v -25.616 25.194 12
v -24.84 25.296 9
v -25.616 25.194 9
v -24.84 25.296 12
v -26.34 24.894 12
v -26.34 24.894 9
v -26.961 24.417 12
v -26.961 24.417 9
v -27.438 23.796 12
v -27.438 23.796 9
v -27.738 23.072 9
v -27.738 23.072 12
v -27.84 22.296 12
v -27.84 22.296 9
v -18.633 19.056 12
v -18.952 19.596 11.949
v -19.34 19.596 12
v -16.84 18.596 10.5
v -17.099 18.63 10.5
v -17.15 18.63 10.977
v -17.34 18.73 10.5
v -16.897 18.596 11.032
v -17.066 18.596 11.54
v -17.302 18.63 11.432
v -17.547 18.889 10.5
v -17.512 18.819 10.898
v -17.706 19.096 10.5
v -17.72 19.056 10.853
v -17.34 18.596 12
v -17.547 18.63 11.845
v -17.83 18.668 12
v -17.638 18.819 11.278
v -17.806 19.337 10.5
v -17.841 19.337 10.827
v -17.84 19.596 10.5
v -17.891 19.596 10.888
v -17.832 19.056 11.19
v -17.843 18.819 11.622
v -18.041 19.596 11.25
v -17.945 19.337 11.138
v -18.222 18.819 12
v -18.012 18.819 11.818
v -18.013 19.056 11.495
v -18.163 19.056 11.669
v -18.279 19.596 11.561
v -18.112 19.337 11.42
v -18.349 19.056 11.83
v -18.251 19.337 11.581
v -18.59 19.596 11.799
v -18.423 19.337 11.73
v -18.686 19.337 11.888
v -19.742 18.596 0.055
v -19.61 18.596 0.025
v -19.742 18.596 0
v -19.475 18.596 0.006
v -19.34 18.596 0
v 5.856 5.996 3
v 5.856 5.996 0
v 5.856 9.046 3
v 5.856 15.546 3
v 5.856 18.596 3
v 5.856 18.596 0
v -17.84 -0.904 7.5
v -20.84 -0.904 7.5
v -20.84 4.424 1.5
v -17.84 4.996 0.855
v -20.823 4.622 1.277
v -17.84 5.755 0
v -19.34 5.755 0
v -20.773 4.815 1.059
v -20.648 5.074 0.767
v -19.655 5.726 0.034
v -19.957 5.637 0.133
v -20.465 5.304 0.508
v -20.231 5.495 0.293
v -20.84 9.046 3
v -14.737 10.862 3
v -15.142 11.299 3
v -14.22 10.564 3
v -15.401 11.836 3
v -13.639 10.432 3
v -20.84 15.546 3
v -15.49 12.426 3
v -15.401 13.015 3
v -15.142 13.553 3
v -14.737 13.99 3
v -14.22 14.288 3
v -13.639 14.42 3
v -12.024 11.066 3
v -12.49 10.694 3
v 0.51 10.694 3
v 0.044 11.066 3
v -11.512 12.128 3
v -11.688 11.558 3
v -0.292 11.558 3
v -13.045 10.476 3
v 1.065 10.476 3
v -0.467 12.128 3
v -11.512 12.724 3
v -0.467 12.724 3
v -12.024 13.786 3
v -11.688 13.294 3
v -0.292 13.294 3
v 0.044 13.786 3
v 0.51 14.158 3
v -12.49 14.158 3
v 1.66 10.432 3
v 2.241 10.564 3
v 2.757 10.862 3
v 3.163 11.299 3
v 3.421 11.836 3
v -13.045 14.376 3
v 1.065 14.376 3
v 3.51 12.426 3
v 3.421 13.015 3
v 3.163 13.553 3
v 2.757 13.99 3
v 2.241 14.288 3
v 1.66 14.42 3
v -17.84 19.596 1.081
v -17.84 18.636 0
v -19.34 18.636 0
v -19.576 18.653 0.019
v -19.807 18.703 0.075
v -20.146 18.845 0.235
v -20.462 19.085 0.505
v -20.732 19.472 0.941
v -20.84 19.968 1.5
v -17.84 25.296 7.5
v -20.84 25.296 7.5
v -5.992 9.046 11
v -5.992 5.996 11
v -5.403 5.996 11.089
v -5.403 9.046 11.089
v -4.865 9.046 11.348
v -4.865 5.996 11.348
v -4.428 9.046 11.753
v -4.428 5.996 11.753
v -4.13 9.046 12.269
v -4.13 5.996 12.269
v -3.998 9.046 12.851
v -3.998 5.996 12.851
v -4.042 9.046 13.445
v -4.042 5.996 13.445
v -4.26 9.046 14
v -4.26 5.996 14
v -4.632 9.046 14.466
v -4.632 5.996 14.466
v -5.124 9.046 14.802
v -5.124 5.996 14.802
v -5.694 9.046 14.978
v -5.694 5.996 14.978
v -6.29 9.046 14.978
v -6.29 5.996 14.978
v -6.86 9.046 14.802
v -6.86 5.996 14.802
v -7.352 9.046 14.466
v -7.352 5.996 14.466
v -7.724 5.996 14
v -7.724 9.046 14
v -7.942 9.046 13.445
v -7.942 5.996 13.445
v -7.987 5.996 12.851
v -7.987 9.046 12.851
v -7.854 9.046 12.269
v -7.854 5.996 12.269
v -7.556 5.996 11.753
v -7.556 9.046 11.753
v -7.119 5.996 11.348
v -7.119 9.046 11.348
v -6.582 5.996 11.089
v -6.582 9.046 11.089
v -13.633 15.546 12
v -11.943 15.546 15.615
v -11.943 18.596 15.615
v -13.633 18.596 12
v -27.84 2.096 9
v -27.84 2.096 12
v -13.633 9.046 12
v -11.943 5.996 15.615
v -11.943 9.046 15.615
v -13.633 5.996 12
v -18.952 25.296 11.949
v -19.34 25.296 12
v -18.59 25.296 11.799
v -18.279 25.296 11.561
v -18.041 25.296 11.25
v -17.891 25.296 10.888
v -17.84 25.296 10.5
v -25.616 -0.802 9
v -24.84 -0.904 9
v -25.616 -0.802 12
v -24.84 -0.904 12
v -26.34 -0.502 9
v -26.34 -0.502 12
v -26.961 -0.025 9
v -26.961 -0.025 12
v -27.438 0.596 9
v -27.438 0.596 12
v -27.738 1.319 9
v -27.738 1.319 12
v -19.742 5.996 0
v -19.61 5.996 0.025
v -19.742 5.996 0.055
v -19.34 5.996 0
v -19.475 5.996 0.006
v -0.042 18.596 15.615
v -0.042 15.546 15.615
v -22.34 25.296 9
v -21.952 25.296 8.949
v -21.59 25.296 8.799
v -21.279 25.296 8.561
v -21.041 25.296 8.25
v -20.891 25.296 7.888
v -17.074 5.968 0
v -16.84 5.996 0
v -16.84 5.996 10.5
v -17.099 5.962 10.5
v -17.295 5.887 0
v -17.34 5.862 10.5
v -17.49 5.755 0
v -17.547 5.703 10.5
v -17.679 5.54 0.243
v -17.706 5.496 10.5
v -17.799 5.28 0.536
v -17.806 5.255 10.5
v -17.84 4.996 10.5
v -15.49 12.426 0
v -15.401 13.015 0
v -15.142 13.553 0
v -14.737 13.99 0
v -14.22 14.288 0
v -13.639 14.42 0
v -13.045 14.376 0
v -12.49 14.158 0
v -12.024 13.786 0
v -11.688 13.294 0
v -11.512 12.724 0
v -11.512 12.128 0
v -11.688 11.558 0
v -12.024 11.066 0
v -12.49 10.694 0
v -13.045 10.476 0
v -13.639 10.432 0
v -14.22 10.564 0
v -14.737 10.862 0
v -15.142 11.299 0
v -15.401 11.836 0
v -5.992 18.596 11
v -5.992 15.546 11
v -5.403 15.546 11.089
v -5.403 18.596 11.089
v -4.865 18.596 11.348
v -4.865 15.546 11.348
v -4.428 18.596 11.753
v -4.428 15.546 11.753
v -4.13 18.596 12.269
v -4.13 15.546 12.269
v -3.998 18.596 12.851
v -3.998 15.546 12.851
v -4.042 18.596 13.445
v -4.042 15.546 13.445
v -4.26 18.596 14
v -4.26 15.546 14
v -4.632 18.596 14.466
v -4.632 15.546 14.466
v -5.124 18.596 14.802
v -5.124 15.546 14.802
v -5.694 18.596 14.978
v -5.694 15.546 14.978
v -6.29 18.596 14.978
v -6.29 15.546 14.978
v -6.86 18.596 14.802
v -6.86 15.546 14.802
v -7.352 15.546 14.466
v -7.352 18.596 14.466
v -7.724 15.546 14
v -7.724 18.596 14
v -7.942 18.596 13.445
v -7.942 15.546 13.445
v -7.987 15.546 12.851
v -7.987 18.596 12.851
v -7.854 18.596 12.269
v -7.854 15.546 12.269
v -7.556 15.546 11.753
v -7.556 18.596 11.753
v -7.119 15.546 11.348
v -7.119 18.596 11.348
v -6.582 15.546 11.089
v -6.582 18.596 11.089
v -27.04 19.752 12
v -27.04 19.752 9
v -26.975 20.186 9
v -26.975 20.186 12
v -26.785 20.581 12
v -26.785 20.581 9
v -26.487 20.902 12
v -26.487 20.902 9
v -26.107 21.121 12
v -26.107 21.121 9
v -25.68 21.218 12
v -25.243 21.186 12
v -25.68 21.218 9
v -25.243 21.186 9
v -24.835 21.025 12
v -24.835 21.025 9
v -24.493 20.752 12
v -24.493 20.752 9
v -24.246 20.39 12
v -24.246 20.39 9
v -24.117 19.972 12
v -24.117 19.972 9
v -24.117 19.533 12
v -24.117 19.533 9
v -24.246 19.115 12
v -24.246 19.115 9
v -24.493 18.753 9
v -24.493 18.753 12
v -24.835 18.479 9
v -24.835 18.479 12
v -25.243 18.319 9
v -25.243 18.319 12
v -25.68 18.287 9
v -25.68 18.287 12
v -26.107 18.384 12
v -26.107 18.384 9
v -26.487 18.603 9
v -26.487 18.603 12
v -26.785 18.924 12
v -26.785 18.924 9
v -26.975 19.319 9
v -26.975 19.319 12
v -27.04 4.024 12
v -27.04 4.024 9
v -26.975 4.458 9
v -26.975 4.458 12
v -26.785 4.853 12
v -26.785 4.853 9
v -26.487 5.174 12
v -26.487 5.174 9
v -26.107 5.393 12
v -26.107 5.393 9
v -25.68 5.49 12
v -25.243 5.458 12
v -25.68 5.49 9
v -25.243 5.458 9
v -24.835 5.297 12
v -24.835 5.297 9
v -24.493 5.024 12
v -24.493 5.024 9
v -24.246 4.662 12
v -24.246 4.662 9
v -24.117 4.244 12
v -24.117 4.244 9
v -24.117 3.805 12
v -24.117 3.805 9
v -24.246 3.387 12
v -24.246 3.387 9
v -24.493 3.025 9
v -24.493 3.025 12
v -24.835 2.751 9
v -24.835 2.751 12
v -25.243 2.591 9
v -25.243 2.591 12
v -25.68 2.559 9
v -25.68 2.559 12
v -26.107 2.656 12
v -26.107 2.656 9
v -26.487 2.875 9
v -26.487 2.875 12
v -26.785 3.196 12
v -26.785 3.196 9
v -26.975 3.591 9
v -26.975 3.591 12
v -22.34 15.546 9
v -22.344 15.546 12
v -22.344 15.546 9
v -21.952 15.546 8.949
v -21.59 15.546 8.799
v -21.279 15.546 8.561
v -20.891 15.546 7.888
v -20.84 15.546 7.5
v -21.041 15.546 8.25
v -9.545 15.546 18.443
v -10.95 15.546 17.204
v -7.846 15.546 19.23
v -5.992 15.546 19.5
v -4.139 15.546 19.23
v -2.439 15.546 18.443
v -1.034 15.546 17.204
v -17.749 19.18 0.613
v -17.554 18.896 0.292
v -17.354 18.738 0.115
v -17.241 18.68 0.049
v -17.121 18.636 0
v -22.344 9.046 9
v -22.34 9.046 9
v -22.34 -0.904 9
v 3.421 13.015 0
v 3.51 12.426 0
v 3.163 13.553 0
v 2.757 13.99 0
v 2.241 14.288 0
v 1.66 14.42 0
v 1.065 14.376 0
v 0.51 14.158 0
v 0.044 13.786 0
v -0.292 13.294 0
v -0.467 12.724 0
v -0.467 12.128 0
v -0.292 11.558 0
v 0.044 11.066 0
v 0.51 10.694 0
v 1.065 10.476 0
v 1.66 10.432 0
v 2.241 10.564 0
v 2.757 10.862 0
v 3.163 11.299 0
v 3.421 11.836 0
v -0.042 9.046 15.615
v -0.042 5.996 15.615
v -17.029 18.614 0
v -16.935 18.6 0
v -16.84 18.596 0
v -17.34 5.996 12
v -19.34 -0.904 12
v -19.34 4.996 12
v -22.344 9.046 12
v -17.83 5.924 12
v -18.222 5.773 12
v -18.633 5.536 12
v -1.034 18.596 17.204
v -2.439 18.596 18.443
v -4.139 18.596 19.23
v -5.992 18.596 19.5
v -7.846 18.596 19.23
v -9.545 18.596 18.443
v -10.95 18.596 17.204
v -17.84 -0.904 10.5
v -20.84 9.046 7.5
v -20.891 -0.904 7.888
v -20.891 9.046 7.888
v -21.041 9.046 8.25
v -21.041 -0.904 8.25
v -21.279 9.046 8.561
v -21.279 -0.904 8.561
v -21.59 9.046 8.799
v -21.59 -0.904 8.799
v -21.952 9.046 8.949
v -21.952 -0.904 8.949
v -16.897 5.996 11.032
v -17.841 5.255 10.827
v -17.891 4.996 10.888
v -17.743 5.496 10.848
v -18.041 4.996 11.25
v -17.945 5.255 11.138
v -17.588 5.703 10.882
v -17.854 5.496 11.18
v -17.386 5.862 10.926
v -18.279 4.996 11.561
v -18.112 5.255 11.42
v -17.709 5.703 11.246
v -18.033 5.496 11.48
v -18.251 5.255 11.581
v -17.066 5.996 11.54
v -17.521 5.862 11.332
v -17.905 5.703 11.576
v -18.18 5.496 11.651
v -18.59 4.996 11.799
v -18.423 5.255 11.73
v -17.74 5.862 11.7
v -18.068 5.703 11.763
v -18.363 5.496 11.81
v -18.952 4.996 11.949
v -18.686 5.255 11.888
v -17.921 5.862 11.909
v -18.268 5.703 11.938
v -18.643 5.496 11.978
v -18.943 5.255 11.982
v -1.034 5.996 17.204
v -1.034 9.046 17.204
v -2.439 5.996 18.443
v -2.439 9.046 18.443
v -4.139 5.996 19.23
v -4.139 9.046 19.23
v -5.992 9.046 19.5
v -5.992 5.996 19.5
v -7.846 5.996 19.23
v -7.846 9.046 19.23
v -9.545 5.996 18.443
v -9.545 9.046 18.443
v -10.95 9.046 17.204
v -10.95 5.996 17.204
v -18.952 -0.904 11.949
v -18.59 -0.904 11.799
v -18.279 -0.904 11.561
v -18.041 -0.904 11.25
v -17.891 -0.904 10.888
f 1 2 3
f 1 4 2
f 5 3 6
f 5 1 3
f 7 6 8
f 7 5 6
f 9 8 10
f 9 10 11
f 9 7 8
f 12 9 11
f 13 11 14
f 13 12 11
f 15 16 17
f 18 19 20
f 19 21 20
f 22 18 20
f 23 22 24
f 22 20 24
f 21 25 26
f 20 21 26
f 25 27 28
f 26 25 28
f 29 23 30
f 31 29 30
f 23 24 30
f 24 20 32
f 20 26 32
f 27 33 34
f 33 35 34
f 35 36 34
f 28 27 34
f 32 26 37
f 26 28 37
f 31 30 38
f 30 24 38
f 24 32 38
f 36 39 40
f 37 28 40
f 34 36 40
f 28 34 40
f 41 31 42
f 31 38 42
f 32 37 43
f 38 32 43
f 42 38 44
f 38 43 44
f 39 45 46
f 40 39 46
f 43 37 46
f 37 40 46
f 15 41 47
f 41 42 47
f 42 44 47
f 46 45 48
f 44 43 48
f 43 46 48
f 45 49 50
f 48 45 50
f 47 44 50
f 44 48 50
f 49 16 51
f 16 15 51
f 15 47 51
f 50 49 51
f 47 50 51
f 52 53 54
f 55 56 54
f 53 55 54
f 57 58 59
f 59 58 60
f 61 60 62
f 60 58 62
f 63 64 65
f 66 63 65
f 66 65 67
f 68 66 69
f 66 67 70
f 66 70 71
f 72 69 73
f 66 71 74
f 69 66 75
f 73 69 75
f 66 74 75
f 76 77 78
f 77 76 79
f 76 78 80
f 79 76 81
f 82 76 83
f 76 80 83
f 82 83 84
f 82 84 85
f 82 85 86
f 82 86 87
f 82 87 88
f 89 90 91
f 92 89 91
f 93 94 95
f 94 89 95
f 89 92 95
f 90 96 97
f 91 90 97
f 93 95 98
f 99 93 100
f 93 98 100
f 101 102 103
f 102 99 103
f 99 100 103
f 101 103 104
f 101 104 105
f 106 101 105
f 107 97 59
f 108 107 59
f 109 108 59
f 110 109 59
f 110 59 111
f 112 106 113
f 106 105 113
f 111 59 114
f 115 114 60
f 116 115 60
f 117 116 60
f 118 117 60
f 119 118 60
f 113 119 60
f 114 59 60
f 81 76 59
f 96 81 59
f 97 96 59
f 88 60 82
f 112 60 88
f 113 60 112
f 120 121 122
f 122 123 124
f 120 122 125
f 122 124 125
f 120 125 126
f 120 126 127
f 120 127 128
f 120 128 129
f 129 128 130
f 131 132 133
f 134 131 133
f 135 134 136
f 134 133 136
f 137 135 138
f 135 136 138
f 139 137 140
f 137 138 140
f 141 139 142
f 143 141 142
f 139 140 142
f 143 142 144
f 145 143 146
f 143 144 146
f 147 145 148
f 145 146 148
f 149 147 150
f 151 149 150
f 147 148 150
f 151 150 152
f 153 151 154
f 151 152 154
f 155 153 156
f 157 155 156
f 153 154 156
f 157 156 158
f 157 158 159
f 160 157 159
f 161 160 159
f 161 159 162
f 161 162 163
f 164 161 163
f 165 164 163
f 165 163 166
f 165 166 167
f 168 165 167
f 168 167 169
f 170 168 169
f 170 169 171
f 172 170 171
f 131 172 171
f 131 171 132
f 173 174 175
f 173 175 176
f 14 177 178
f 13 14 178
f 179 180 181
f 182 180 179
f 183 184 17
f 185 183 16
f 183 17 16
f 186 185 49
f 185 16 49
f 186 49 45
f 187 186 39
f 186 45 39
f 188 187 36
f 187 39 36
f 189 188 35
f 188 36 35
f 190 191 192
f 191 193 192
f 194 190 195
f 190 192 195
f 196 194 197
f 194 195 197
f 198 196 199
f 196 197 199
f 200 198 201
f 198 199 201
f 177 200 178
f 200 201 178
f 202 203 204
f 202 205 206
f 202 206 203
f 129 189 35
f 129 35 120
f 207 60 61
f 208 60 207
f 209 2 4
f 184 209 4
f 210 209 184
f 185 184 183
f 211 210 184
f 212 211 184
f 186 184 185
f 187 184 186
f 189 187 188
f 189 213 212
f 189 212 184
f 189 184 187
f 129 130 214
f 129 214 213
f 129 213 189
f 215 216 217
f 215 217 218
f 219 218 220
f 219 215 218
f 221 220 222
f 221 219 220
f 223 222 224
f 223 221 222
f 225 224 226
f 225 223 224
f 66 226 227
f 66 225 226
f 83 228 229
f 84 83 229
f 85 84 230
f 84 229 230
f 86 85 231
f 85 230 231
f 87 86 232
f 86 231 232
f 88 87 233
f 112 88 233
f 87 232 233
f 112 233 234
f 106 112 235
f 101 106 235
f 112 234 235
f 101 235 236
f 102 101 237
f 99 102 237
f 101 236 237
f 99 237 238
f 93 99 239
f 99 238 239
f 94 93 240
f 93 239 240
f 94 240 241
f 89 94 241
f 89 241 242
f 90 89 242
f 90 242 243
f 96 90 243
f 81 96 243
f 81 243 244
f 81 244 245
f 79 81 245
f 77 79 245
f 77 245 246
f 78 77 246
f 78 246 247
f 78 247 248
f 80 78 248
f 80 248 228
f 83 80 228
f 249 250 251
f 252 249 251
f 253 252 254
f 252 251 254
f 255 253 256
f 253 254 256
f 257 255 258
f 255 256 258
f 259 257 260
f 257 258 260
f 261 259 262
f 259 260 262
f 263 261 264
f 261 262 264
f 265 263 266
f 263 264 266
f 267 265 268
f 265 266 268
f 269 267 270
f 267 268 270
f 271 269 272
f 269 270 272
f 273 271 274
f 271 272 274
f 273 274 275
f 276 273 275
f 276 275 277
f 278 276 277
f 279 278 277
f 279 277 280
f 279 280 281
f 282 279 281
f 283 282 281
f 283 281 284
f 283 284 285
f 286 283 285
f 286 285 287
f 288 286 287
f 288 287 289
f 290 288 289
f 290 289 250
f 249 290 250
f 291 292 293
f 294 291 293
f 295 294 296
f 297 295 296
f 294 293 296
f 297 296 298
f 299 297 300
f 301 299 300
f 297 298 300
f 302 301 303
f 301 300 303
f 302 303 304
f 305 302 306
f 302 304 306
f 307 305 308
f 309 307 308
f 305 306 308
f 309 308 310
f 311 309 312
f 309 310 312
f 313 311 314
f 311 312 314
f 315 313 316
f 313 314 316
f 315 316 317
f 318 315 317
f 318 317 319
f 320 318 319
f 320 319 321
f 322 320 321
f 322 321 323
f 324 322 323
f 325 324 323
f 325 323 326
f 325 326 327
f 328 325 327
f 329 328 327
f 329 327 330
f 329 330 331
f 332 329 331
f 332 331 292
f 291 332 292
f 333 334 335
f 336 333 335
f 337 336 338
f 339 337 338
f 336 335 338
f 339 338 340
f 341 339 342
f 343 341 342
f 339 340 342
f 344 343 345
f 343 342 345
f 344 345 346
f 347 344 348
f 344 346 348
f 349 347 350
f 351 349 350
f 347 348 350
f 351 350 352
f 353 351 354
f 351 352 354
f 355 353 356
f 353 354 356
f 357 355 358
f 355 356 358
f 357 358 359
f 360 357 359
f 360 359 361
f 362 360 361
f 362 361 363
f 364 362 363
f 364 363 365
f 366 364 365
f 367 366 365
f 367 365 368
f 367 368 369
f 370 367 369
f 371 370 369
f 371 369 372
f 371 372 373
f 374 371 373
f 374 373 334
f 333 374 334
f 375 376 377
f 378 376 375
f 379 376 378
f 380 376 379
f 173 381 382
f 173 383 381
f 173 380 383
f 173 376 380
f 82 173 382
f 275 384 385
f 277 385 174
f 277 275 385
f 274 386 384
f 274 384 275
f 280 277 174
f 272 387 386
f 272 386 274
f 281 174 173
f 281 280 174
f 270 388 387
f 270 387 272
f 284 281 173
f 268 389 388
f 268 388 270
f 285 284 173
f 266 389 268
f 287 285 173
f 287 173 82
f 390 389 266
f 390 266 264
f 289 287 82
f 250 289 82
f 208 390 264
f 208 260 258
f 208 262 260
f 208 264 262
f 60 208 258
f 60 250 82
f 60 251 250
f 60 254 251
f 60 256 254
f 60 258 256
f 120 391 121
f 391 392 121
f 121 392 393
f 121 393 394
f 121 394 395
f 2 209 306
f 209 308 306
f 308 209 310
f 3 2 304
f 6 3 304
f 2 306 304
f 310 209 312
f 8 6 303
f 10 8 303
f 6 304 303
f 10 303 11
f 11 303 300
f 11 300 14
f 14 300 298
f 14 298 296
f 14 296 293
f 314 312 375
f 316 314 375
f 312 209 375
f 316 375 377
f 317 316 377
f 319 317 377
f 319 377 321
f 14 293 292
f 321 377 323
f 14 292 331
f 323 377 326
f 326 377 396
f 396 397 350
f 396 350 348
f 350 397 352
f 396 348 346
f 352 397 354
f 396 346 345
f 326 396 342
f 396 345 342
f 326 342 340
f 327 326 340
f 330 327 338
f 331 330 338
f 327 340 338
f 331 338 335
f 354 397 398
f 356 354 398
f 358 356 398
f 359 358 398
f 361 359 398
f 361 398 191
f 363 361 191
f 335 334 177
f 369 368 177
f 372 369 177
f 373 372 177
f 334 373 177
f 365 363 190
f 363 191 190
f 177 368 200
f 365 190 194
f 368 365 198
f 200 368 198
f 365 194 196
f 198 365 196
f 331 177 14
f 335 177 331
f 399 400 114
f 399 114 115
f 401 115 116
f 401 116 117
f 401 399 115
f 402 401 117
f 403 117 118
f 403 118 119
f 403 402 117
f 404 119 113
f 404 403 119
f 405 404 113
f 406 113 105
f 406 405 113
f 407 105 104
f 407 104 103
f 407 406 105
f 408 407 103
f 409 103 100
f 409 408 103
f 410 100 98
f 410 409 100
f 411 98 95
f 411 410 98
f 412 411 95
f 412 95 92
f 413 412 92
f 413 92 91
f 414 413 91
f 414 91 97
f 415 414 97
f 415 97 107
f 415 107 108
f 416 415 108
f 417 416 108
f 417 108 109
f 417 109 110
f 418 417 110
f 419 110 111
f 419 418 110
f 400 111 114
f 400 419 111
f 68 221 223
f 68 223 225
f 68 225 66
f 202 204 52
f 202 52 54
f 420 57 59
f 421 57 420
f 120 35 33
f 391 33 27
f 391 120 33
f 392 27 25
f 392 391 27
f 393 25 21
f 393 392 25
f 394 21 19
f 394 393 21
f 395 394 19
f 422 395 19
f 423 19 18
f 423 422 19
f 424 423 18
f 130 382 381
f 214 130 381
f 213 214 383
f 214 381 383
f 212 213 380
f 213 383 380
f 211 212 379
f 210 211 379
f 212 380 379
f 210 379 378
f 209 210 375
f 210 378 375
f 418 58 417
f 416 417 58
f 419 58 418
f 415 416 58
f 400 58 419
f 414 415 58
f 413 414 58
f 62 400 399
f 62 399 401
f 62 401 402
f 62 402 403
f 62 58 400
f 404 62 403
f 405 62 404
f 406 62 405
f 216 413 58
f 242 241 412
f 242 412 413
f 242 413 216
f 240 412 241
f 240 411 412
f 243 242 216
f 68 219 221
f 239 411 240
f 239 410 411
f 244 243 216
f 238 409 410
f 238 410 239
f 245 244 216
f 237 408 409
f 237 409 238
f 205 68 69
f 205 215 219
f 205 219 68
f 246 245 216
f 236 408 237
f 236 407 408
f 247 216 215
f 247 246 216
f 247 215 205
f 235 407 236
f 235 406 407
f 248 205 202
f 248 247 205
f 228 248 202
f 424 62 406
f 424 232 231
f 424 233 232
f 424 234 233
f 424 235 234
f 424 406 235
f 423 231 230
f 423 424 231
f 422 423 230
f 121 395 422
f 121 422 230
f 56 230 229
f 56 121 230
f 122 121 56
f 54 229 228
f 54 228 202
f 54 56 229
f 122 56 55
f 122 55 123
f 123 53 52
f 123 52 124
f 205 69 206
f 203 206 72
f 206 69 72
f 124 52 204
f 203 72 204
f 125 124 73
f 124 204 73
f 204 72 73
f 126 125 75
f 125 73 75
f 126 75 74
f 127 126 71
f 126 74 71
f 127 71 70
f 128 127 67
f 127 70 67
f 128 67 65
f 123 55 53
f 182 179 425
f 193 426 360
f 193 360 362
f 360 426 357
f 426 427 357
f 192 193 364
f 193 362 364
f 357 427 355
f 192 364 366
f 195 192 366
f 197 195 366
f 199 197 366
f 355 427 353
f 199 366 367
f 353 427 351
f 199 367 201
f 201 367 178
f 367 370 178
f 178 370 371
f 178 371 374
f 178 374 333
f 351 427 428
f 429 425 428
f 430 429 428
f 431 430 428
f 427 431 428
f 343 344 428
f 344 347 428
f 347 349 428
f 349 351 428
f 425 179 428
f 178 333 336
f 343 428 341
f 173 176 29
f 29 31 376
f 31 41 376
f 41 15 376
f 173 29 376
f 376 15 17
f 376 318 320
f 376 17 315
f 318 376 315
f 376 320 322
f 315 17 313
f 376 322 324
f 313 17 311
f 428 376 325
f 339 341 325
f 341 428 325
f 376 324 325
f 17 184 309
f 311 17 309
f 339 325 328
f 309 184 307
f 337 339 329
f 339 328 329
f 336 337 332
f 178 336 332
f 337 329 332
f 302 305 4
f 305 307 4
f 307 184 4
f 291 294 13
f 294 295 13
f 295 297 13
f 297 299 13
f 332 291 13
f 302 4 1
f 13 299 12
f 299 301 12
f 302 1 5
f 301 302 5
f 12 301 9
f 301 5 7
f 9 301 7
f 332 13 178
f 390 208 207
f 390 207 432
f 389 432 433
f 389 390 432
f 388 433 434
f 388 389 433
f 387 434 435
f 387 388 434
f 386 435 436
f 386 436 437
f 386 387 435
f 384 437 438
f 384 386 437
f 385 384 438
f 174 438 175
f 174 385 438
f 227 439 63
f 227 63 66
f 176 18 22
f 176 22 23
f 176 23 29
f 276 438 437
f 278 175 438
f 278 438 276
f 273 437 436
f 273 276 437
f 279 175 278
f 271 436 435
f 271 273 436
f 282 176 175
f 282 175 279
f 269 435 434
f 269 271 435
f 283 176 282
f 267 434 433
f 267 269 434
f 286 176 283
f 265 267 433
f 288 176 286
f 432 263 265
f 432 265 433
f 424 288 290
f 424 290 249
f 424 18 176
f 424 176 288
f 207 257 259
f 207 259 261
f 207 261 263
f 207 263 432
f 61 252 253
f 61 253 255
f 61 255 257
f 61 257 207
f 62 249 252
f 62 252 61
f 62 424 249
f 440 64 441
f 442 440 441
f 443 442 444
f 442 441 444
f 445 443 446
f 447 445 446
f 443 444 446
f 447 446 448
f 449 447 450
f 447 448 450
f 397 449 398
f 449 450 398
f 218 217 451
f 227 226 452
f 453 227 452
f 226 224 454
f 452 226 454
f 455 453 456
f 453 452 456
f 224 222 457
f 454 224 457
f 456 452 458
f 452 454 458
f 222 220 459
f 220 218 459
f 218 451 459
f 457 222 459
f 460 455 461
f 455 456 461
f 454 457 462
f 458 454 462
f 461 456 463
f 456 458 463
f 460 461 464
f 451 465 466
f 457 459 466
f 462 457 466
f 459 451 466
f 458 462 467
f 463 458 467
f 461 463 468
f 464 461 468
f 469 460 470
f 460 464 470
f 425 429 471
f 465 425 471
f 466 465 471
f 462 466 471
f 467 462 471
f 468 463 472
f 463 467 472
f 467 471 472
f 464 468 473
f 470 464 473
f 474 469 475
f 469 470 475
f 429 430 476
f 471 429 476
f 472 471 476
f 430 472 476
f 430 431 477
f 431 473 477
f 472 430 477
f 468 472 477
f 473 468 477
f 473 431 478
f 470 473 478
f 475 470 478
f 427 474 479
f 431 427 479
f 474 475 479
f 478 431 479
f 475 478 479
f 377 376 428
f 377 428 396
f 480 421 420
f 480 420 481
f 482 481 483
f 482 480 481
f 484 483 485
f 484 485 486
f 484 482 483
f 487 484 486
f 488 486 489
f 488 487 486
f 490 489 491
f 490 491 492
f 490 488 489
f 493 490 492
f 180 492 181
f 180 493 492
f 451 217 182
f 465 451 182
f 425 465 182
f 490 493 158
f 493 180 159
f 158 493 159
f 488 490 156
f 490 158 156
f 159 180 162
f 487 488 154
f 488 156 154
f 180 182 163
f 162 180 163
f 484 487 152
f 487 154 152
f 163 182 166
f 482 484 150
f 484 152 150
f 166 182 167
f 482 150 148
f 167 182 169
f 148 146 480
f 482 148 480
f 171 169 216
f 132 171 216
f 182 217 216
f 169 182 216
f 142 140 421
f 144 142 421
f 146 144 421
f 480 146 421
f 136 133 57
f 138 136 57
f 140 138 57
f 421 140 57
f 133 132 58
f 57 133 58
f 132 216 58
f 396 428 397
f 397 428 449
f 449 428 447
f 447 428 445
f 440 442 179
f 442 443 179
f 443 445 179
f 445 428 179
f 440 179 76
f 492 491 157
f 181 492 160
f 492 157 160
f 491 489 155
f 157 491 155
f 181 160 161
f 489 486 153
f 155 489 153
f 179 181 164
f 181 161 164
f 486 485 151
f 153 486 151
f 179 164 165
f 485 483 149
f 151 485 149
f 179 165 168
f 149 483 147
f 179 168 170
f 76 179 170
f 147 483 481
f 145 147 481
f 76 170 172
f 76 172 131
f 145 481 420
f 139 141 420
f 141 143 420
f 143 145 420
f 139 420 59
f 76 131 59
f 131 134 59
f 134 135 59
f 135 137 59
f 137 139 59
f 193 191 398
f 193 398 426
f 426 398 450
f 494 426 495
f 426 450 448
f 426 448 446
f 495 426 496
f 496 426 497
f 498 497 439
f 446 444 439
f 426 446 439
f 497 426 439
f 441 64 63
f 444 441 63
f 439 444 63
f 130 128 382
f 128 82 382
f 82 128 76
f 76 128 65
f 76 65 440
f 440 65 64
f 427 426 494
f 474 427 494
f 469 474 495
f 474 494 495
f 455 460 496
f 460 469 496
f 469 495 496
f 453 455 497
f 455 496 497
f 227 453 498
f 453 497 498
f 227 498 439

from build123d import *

# Parameters (mm, degrees)
ESQUISSE1_W             = 23.695260015
ESQUISSE1_H             = 12.6
ESQUISSE1_R             = 2
BOSS_EXTRU_1_DEPTH      = 3
ESQUISSE3_R             = 2
BOSS_EXTRU_2_DEPTH      = 12.6
BOSS_EXTRU_4_DEPTH      = 6.7
BOSS_EXTRU_4_DEPTH_BACK = 19.5
ENL_V_MAT_EXTRU_2_DEPTH = 3
ESQUISSE8_W             = 8.43757856
ESQUISSE8_H             = 12
BOSS_EXTRU_5_DEPTH      = 12.6
ESQUISSE5_W             = 20.633758591
ESQUISSE5_H             = 6.5
ENL_V_MAT_EXTRU_1_DEPTH = 28.2
CONG_3_R                = 1
ESQUISSE9_R             = 2
ENL_V_MAT_EXTRU_3_DEPTH = 3.6
ESQUISSE11_R            = 1.47
ENL_V_MAT_EXTRU_4_DEPTH = 3.6
CONG_4_R                = 3


with BuildPart() as part:
    # Esquisse1 → Boss.-Extru.1 (new body)
    with BuildSketch(Plane.XY):
        with Locations((-5.99209908, 12.295954438)):
            Rectangle(ESQUISSE1_W, ESQUISSE1_H)
        with Locations((-13.489729087, 12.425985115)):
            Circle(ESQUISSE1_R, mode=Mode.SUBTRACT)
        with Locations((1.510270913, 12.425985115)):
            Circle(ESQUISSE1_R, mode=Mode.SUBTRACT)
    extrude(amount=BOSS_EXTRU_1_DEPTH)

    # Esquisse3 → Boss.-Extru.2 (add)
    with BuildSketch(Plane.XZ.offset(-5.995954438)):
        with BuildLine():
            Line((-17.839729087, 3), (5.855530928, 3))
            Line((5.855530928, 3), (-0.041538546, 15.615497913))
            ThreePointArc((-0.041538546, 15.615497913), (-5.99209908, 19.5), (-11.942659613, 15.615497913))
            Line((-11.942659613, 15.615497913), (-17.839729087, 3))
        make_face()
        with Locations(Location((-5.99209908, 13, 0), (0, 0, 270))):
            Circle(ESQUISSE3_R, mode=Mode.SUBTRACT)
    extrude(amount=-BOSS_EXTRU_2_DEPTH)

    # Esquisse6 → Boss.-Extru.4 (add, two sides: drawn at the far end of the back side and taken through both)
    with BuildSketch(Plane(origin=(0, 18.595954438, 0), x_dir=(1, 0, 0), z_dir=(0, 1, 0)).offset(-BOSS_EXTRU_4_DEPTH_BACK)):
        with BuildLine():
            Line((-17.839729087, -3), (-17.839729087, 0))
            Line((-17.839729087, 0), (-19.339729087, 0))
            ThreePointArc((-19.339729087, 0), (-20.400389259, -0.439339828), (-20.839729087, -1.5))
            Line((-20.839729087, -1.5), (-20.839729087, -7.5))
            ThreePointArc((-20.839729087, -7.5), (-21.279068915, -8.560660172), (-22.339729087, -9))
            Line((-22.339729087, -9), (-27.839729087, -9))
            Line((-27.839729087, -9), (-27.839729087, -12))
            Line((-27.839729087, -12), (-19.944823835, -12))
            Line((-19.944823835, -12), (-19.339729087, -12))
            ThreePointArc((-19.339729087, -12), (-18.279068915, -11.560660172), (-17.839729087, -10.5))
            Line((-17.839729087, -10.5), (-17.839729087, -8.3919439))
            Line((-17.839729087, -8.3919439), (-17.839729087, -3))
        make_face()
    extrude(amount=BOSS_EXTRU_4_DEPTH + BOSS_EXTRU_4_DEPTH_BACK)

    # Esquisse7 → Enlèv. mat.-Extru.2 (cut)
    with BuildSketch(Plane.ZY.offset(20.839729087)):
        Polygon((-6.140344815, 12.195954438), (-6.42704232, 7.753847566), (-3.772480019, -6.539015172), (6.059758422, -5.019044791), (7.5, -0.904045562), (-0.069254369, 5.816985209), (-0.466179864, 12.195954438), (-0.069254369, 18.574923667), (7.5, 25.295954438), (6.059758422, 29.410953667), (-3.772480019, 30.930924048), (-6.42704232, 16.638061311), align=None)
    extrude(amount=-ENL_V_MAT_EXTRU_2_DEPTH, mode=Mode.SUBTRACT)

    # Esquisse8 → Boss.-Extru.5 (add)
    with BuildSketch(Plane(origin=(0, 5.995954438, 0), x_dir=(-1, 0, 0), z_dir=(0, -1, 0))):
        with Locations((15.523391269, -6)):
            Rectangle(ESQUISSE8_W, ESQUISSE8_H)
    extrude(amount=-BOSS_EXTRU_5_DEPTH)

    # Esquisse5 → Enlèv. mat.-Extru.1 (cut)
    with BuildSketch(Plane(origin=(5.855530928, 0, 0), x_dir=(0, 0, -1), z_dir=(1, 0, 0))):
        with Locations((-13.316879296, 12.295954438)):
            Rectangle(ESQUISSE5_W, ESQUISSE5_H)
    extrude(amount=-ENL_V_MAT_EXTRU_1_DEPTH, mode=Mode.SUBTRACT)

    # Congé3
    # the kernel refuses this fillet: 1 mm, written as the material it adds along each edge
    with BuildSketch(Plane(origin=(-19.339729087, 18.595954438, 10.5), x_dir=(1, 0, 0), z_dir=(0, 0, -1))) as cong_3_piece_1_section:
        with BuildLine():
            CenterArc((1.5 + CONG_3_R, -CONG_3_R), CONG_3_R, 90, 90)
            Line((1.5, -CONG_3_R), (1.5, 0))
            Line((1.5, 0), (1.5 + CONG_3_R, 0))
        make_face()
    cong_3_piece_1 = revolve(axis=Axis((-19.339729087, 18.595954438, 10.5), (0, -1, 0)), revolution_arc=185.531326158, mode=Mode.PRIVATE)
    cong_3_piece_1 = split(cong_3_piece_1, bisect_by=Plane(origin=(-17.625243019, 18.758648555, 12), z_dir=(0, 0, -1)), keep=Keep.TOP, mode=Mode.PRIVATE)
    add(cong_3_piece_1)
    with BuildSketch(Plane(origin=(-19.339729087, 5.995954438, 10.5), x_dir=(1, 0, 0), z_dir=(0, 0, -1))) as cong_3_piece_2_section:
        with BuildLine():
            CenterArc((1.5 + CONG_3_R, CONG_3_R), CONG_3_R, 180, 90)
            Line((1.5 + CONG_3_R, 0), (1.5, 0))
            Line((1.5, 0), (1.5, CONG_3_R))
        make_face()
    cong_3_piece_2 = revolve(axis=Axis((-19.339729087, 5.995954438, 10.5), (0, -1, 0)), revolution_arc=185.531326158, mode=Mode.PRIVATE)
    cong_3_piece_2 = split(cong_3_piece_2, bisect_by=Plane(origin=(-18.22928563, 5.709154501, 12), z_dir=(0, 0, -1)), keep=Keep.TOP, mode=Mode.PRIVATE)
    add(cong_3_piece_2)
    with BuildSketch(Plane(origin=(-17.839729087, 18.595954438, 0), x_dir=(1, 0, 0), z_dir=(0, 0, 1))) as cong_3_piece_3_section:
        with BuildLine():
            CenterArc((CONG_3_R, CONG_3_R), CONG_3_R, 180, 90)
            Line((0, CONG_3_R), (0, 0))
            Line((0, 0), (CONG_3_R, 0))
        make_face()
    cong_3_piece_3 = extrude(amount=10.5, mode=Mode.PRIVATE)
    cong_3_piece_3 = split(cong_3_piece_3, bisect_by=Plane(origin=(-17.614169597, 21.372960388, 3.081906873), z_dir=(0, -0.7477621735263639, 0.6639666647077458)), keep=Keep.TOP, mode=Mode.PRIVATE)
    add(cong_3_piece_3)
    with BuildSketch(Plane(origin=(-17.839729087, 5.995954438, 0), x_dir=(1, 0, 0), z_dir=(0, 0, 1))) as cong_3_piece_4_section:
        with BuildLine():
            CenterArc((CONG_3_R, -CONG_3_R), CONG_3_R, 90, 90)
            Line((0, -CONG_3_R), (0, 0))
            Line((0, 0), (CONG_3_R, 0))
        make_face()
    cong_3_piece_4 = extrude(amount=10.5, mode=Mode.PRIVATE)
    cong_3_piece_4 = split(cong_3_piece_4, bisect_by=Plane(origin=(-17.615177954, 3.13865295, 2.947095183), z_dir=(0, 0.747762173526364, 0.6639666647077457)), keep=Keep.TOP, mode=Mode.PRIVATE)
    add(cong_3_piece_4)

    # Esquisse9 → Enlèv. mat.-Extru.3 (cut)
    with BuildSketch(Plane(origin=(0, 0, 0), x_dir=(-1, 0, 0), z_dir=(0, 0, -1))):
        with Locations((13.489729087, 12.425985115)):
            Circle(ESQUISSE9_R)
    extrude(amount=-ENL_V_MAT_EXTRU_3_DEPTH, mode=Mode.SUBTRACT)

    # Esquisse11 → Enlèv. mat.-Extru.4 (cut)
    with BuildSketch(Plane(origin=(0, 0, 9), x_dir=(-1, 0, 0), z_dir=(0, 0, -1))):
        with Locations((25.570191421, 4.024422561)):
            Circle(ESQUISSE11_R)
        with Locations((25.570191421, 19.752422561)):
            Circle(ESQUISSE11_R)
    extrude(amount=-ENL_V_MAT_EXTRU_4_DEPTH, mode=Mode.SUBTRACT)

    # Congé4
    cong_4_edges = [part.edges().sort_by_distance(p)[0] for p in [
        (-27.839729087, 25.295954438, 10.5),
        (-27.839729087, -0.904045562, 10.5),
    ]]
    fillet(cong_4_edges, radius=CONG_4_R)


solid = part.part
